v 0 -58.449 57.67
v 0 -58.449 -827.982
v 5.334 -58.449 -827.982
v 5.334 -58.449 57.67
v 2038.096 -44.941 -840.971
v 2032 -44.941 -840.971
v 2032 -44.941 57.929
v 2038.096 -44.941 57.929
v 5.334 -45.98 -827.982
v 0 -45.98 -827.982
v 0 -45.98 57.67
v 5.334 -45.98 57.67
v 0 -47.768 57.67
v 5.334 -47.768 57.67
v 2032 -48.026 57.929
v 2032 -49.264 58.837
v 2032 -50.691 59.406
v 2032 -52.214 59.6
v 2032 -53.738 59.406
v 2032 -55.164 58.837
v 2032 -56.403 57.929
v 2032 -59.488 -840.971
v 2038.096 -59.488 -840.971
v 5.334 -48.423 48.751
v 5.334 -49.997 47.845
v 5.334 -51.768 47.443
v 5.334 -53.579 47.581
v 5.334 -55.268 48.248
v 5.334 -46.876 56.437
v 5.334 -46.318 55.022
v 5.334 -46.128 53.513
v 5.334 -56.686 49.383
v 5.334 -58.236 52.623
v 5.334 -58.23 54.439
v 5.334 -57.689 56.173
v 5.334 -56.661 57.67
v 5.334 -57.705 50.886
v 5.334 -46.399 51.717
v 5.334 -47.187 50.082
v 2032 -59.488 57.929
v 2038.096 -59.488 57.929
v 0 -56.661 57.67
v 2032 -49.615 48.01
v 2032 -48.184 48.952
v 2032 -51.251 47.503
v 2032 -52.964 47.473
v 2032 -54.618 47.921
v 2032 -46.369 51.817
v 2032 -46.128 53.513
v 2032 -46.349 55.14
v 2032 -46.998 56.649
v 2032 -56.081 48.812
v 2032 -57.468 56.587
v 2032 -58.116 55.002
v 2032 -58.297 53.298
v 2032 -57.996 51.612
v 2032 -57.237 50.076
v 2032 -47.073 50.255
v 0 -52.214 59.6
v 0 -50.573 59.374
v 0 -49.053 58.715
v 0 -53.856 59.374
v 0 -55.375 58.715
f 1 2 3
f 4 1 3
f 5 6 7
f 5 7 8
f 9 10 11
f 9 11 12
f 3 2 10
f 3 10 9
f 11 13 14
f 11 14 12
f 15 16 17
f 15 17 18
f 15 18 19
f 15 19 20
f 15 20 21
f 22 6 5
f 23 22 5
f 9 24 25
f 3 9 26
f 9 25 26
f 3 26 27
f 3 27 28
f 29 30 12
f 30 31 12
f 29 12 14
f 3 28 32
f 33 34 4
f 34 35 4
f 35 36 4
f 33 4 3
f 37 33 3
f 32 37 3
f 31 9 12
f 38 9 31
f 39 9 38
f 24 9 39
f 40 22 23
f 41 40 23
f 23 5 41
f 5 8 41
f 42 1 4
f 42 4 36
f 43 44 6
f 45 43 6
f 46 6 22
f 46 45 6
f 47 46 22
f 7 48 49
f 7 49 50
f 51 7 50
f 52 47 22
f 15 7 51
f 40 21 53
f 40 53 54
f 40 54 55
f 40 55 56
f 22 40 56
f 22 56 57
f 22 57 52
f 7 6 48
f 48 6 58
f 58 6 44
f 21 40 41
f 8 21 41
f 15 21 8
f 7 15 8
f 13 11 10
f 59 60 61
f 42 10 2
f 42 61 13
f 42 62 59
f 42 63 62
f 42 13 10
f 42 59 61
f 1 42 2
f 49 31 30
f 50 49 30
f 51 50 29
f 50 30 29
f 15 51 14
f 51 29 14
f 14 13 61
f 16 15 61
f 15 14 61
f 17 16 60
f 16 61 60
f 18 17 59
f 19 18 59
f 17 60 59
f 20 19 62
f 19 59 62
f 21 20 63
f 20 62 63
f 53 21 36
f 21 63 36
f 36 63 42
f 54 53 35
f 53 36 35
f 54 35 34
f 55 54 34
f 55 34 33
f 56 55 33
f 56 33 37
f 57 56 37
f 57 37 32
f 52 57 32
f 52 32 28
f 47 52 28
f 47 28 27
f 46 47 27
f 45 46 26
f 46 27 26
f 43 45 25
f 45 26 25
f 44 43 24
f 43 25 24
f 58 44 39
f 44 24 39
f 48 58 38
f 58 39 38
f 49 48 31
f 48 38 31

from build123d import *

# Parameters (mm, degrees)
F0_R     = 6.0866726669
F1_DEPTH = 2032
F2_W     = 12.4690905213
F2_H     = 123.6518211663
F3_DEPTH = 5.334
F4_W     = 14.5472697914
F4_H     = 136.9002275169
F5_DEPTH = 6.096
F6_W     = 6.096
F6_H     = 14.5472697914
F7_DEPTH = 762
F8_W     = 5.334
F8_H     = 12.4690905213
F9_DEPTH = 762


with BuildPart() as f1:
    # F0 (on Right) → F1 (new body)
    with BuildSketch(Plane.YZ):
        with Locations((-52.2143170238, 53.5131841898)):
            Circle(F0_R)
    extrude(amount=F1_DEPTH)

    # F2 (on Right) → F3 (join)
    with BuildSketch(Plane.YZ):
        with Locations((-52.214320749, -4.156364128)):
            Rectangle(F2_W, F2_H)
    extrude(amount=F3_DEPTH)

    # F4 (on face) → F5 (join)
    with BuildSketch(Plane.YZ.offset(2032)):
        with Locations((-52.2143188864, -10.5207953602)):
            Rectangle(F4_W, F4_H)
    extrude(amount=F5_DEPTH)

    # F6 (on face) → F7 (join)
    with BuildSketch(Plane(origin=(0, 0, -78.9709091187), x_dir=(1, 0, 0), z_dir=(0, 0, -1))):
        with Locations((2035.048, 52.2143188864)):
            Rectangle(F6_W, F6_H)
    extrude(amount=F7_DEPTH)

    # F8 (on face) → F9 (join)
    with BuildSketch(Plane(origin=(0, 0, -65.9822747111), x_dir=(1, 0, 0), z_dir=(0, 0, -1))):
        with Locations((2.667, 52.214320749)):
            Rectangle(F8_W, F8_H)
    extrude(amount=F9_DEPTH)


solid = f1.part
